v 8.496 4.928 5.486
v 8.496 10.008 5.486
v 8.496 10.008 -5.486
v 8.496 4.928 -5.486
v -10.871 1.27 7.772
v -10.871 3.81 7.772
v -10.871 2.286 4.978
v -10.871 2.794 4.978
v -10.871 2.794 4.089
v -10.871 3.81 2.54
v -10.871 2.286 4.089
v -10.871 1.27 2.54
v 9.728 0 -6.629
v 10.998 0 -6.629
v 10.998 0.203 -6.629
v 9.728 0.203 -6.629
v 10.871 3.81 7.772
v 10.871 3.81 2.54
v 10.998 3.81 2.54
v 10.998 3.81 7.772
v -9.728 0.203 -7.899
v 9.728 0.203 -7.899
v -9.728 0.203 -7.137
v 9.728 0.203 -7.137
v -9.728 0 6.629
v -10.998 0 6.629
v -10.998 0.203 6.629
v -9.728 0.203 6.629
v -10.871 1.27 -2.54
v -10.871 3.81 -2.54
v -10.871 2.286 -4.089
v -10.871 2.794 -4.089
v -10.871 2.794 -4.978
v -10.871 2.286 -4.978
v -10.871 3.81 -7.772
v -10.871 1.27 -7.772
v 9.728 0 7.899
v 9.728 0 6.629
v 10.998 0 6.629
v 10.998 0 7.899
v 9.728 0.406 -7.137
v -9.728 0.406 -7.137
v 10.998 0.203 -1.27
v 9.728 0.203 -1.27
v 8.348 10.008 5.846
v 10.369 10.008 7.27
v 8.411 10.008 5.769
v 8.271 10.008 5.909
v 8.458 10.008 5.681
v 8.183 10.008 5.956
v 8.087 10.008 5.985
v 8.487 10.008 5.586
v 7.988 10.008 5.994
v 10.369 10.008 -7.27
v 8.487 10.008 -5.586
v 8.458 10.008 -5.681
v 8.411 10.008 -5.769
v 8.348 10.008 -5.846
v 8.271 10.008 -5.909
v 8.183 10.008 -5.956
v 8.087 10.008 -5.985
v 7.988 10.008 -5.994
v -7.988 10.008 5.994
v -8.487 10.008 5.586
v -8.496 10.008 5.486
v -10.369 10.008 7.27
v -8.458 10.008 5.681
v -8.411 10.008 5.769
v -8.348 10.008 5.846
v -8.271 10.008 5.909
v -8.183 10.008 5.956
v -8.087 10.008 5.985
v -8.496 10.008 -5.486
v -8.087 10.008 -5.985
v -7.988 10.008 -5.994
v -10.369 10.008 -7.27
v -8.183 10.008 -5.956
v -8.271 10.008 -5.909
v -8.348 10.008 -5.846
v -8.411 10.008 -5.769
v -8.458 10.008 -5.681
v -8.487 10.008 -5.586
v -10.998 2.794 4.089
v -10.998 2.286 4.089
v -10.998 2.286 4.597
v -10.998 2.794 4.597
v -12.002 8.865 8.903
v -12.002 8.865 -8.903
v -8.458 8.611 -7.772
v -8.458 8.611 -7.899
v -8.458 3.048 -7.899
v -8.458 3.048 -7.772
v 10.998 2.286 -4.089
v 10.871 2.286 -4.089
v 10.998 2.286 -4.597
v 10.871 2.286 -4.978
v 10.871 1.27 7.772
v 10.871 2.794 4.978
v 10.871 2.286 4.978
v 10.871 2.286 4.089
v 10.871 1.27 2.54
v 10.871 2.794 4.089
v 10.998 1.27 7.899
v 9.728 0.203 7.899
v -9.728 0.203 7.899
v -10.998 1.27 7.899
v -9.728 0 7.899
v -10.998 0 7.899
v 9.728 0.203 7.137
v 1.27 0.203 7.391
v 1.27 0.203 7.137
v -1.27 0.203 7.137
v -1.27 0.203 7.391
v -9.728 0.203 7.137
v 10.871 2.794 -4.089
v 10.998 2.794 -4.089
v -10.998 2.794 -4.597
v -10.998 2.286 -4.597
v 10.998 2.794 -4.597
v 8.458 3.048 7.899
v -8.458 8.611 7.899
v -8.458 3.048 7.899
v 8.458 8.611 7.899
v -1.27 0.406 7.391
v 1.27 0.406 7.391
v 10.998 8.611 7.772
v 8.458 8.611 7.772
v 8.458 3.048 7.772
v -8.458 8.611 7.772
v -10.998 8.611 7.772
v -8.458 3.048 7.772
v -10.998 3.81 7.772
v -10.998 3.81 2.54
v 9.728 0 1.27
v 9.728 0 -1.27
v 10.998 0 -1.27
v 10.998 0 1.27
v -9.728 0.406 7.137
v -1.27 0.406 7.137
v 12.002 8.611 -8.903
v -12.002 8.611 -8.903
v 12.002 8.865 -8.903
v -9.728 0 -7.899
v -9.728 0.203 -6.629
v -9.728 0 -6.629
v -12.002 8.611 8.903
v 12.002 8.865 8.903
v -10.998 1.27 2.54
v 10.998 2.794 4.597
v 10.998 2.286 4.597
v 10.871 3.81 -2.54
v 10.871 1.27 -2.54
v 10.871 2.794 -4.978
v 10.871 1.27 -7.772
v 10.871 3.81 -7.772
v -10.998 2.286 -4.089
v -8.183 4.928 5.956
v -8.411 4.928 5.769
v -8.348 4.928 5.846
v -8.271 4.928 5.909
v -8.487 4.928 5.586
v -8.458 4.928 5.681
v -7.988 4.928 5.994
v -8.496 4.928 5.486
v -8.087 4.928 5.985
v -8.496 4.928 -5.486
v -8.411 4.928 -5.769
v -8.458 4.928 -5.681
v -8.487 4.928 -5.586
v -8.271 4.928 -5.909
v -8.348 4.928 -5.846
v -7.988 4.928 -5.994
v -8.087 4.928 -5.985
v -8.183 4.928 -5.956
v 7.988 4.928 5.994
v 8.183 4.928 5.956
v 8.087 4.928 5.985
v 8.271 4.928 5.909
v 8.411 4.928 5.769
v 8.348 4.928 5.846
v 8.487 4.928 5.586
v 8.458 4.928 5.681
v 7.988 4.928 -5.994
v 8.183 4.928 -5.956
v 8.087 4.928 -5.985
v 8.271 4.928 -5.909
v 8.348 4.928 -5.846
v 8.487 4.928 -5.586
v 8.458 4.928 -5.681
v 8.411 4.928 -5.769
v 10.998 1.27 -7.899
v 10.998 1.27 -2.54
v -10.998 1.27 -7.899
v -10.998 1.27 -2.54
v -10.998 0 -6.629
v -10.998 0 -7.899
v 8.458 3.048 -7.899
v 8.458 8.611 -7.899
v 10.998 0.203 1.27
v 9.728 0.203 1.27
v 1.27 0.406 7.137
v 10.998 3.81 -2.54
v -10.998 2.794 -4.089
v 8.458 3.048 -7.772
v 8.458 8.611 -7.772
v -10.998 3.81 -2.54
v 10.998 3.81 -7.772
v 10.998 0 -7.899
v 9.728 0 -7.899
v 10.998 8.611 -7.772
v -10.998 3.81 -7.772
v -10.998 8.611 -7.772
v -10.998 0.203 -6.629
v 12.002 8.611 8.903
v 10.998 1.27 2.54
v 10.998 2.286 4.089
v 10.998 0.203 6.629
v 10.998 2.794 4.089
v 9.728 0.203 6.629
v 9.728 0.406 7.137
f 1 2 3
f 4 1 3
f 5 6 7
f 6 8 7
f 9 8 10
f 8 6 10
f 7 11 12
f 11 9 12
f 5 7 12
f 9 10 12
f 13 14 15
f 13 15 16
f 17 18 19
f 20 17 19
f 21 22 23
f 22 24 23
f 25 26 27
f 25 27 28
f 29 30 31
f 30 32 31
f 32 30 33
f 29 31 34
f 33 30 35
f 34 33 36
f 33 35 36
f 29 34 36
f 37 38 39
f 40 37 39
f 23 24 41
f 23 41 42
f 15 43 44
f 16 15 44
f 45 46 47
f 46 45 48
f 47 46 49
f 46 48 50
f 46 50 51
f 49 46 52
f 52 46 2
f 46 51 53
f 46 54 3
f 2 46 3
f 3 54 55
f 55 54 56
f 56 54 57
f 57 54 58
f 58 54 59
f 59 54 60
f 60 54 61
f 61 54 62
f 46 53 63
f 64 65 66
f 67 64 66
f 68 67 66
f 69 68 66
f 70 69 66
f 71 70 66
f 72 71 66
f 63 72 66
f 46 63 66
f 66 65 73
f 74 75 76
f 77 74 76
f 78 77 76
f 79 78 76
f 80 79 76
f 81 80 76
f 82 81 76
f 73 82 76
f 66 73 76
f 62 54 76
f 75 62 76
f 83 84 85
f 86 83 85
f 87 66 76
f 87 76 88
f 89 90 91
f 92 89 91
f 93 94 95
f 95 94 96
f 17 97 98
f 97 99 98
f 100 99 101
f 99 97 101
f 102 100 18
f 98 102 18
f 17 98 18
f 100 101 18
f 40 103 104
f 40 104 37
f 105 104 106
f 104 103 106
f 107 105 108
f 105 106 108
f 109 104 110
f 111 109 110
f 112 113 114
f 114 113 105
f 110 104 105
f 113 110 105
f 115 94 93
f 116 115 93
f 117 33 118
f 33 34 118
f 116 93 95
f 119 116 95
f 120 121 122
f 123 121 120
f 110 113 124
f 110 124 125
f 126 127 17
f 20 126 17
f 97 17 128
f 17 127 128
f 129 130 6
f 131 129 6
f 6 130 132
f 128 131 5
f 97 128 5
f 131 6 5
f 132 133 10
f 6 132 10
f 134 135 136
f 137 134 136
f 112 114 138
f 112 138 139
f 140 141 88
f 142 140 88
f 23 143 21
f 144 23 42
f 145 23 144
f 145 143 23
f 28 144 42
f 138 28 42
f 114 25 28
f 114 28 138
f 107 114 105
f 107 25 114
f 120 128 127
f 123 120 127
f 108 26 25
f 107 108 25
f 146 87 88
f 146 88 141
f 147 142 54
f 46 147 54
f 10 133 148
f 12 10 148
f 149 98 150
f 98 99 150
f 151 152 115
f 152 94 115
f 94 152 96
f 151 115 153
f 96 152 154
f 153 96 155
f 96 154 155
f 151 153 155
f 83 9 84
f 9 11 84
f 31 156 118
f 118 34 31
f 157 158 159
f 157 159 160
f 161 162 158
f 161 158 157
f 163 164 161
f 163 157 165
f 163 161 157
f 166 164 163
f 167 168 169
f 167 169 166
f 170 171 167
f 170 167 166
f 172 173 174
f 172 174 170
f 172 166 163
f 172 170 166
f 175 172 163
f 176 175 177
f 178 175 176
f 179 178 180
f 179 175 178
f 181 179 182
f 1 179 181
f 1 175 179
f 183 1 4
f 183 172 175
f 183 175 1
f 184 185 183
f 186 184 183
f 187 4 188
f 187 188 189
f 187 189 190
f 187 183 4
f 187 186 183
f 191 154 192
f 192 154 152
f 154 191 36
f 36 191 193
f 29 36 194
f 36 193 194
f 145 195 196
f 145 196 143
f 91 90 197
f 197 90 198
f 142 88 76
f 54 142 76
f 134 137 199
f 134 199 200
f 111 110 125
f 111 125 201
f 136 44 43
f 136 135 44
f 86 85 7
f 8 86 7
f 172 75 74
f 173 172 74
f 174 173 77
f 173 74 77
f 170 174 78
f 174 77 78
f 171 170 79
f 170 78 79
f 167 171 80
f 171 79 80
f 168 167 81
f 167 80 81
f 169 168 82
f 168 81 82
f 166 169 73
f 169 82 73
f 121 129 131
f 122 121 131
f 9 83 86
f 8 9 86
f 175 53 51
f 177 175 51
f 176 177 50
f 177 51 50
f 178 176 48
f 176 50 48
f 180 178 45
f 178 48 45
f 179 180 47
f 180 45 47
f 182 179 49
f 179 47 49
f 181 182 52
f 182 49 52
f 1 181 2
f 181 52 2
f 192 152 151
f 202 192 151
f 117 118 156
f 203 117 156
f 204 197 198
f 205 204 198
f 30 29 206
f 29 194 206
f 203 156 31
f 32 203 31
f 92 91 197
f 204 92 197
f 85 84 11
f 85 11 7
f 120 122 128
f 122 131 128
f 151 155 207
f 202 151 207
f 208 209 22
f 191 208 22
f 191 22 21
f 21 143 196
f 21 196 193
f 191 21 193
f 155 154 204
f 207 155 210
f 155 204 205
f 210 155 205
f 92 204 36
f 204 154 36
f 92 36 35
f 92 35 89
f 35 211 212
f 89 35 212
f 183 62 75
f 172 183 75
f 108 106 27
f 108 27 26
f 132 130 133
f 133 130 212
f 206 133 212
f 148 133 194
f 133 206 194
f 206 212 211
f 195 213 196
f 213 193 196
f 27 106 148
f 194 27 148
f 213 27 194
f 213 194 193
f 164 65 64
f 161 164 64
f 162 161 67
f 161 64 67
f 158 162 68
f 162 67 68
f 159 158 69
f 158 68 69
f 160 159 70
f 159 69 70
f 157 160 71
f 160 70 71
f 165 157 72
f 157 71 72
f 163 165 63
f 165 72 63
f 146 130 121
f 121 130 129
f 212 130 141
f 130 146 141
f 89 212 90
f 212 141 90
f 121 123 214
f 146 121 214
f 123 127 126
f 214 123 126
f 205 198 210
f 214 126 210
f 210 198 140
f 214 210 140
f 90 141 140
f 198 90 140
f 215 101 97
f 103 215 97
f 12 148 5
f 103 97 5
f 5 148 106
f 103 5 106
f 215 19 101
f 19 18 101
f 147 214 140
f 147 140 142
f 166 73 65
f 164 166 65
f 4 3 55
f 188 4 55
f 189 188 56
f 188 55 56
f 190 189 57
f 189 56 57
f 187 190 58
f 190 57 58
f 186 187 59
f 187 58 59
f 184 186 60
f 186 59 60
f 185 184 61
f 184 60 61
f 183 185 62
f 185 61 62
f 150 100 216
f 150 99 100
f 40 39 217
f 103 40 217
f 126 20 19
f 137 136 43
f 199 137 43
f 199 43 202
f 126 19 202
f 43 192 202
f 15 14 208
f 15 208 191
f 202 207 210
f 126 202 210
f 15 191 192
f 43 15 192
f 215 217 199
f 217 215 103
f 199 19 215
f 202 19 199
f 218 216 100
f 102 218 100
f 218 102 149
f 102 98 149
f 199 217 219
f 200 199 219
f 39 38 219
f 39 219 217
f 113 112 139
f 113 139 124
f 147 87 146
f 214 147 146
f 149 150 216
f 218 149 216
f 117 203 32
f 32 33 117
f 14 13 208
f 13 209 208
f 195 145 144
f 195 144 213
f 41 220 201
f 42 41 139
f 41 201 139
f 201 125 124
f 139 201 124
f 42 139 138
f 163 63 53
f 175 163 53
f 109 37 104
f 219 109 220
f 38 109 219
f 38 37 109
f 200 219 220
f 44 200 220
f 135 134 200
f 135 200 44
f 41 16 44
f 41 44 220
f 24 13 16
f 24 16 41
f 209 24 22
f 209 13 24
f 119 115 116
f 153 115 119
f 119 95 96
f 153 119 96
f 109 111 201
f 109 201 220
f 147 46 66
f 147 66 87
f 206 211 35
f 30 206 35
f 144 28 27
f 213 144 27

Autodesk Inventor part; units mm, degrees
sketch "Sketch_2" plane through (0, 0, 0) normal (0, 0, 1) x (1, 0, 0)
  line L0 (-12.0015, 8.6106) -> (-10.9982, 8.6106)
  line L1 (-10.9982, 8.6106) -> (-10.9982, 3.81)
  line L2 (-10.9982, 3.81) -> (-10.8712, 3.81)
  line L3 (-10.8712, 3.81) -> (-10.8712, 1.27)
  line L4 (-10.8712, 1.27) -> (-10.9982, 1.27)
  line L5 (-10.9982, 1.27) -> (-10.9982, 0)
  line L6 (-10.9982, 0) -> (10.9982, 0)
  line L7 (10.9982, 0) -> (10.9982, 1.27)
  line L8 (10.9982, 1.27) -> (10.8712, 1.27)
  line L9 (10.8712, 1.27) -> (10.8712, 3.81)
  line L10 (10.8712, 3.81) -> (10.9982, 3.81)
  line L11 (10.9982, 3.81) -> (10.9982, 8.6106)
  line L12 (10.9982, 8.6106) -> (12.0015, 8.6106)
  line L13 (12.0015, 8.6106) -> (12.0015, 8.8646)
  line L14 (12.0015, 8.8646) -> (10.3691, 10.0076)
  line L15 (10.3691, 10.0076) -> (-10.3691, 10.0076)
  line L16 (-10.3691, 10.0076) -> (-12.0015, 8.8646)
  line L17 (-12.0015, 8.8646) -> (-12.0015, 8.6106)
extrude "Extrusion1" add sketch "Sketch_2" along normal mid plane 24.003
sketch "Sketch_1" plane through (0, 0, 0) normal (1, 0, 0) x (0, 1, 0)
  line L0 (12.7, 12.7) -> (-2.54, 12.7)
  line L1 (-2.54, 12.7) -> (-2.54, -12.7)
  line L2 (-2.54, -12.7) -> (12.7, -12.7)
  line L3 (12.7, -12.7) -> (12.7, 12.7)
  line L4 (8.6106, 8.9027) -> (8.6106, 7.7724)
  line L5 (8.6106, 7.7724) -> (1.27, 7.7724)
  line L6 (1.27, 7.7724) -> (1.27, 7.8994)
  line L7 (1.27, 7.8994) -> (0, 7.8994)
  line L8 (0, 7.8994) -> (0, -7.8994)
  line L9 (0, -7.8994) -> (1.27, -7.8994)
  line L10 (1.27, -7.8994) -> (1.27, -7.7724)
  line L11 (1.27, -7.7724) -> (8.6106, -7.7724)
  line L12 (8.6106, -7.7724) -> (8.6106, -8.9027)
  line L13 (8.6106, -8.9027) -> (8.8646, -8.9027)
  line L14 (8.8646, -8.9027) -> (10.0076, -7.2703)
  line L15 (10.0076, -7.2703) -> (10.0076, 7.2703)
  line L16 (10.0076, 7.2703) -> (8.8646, 8.9027)
  line L17 (8.8646, 8.9027) -> (8.6106, 8.9027)
extrude "Extrusion2" cut sketch "Sketch_1" along normal mid plane 25.4
sketch "Sketch_3" plane through (0, 10.0076, 0) normal (0, 1, 0) x (1, 0, 0)
  line L0 (-8.4963, 5.4864) -> (-8.4963, -5.4864)
  arc A0 (-8.4963, -5.4864) -> (-7.9883, -5.9944) centre (-7.9883, -5.4864) ccw
  line L1 (-7.9883, -5.9944) -> (7.9883, -5.9944)
  arc A1 (7.9883, -5.9944) -> (8.4963, -5.4864) centre (7.9883, -5.4864) ccw
  line L2 (8.4963, -5.4864) -> (8.4963, 5.4864)
  arc A2 (8.4963, 5.4864) -> (7.9883, 5.9944) centre (7.9883, 5.4864) ccw
  line L3 (7.9883, 5.9944) -> (-7.9883, 5.9944)
  arc A3 (-7.9883, 5.9944) -> (-8.4963, 5.4864) centre (-7.9883, 5.4864) ccw
sketch "Sketch_4" plane through (0, 0, 0) normal (0, 1, 0) x (-1, 0, 0)
  line L0 (10.9982, -6.6294) -> (10.9982, 6.6294)
  line L1 (10.9982, 6.6294) -> (9.7282, 6.6294)
  line L2 (9.7282, 6.6294) -> (9.7282, 7.8994)
  line L3 (9.7282, 7.8994) -> (-9.7282, 7.8994)
  line L4 (-9.7282, 7.8994) -> (-9.7282, 6.6294)
  line L5 (-9.7282, 6.6294) -> (-10.9982, 6.6294)
  line L6 (-10.9982, 6.6294) -> (-10.9982, 1.27)
  line L7 (-10.9982, 1.27) -> (-9.7282, 1.27)
  line L8 (-9.7282, 1.27) -> (-9.7282, -1.27)
  line L9 (-9.7282, -1.27) -> (-10.9982, -1.27)
  line L10 (-10.9982, -1.27) -> (-10.9982, -6.6294)
  line L11 (-10.9982, -6.6294) -> (-9.7282, -6.6294)
  line L12 (-9.7282, -6.6294) -> (-9.7282, -7.8994)
  line L13 (-9.7282, -7.8994) -> (9.7282, -7.8994)
  line L14 (9.7282, -7.8994) -> (9.7282, -6.6294)
  line L15 (9.7282, -6.6294) -> (10.9982, -6.6294)
extrude "Extrusion3" cut sketch "Sketch_4" along normal blind 0.2032
sketch "Sketch_6" plane through (0, 0, 0) normal (0, 1, 0) x (-1, 0, 0)
  line L0 (9.7282, 7.1374) -> (1.27, 7.1374)
  line L1 (1.27, 7.1374) -> (1.27, 7.3914)
  line L2 (1.27, 7.3914) -> (-1.27, 7.3914)
  line L3 (-1.27, 7.3914) -> (-1.27, 7.1374)
  line L4 (-1.27, 7.1374) -> (-9.7282, 7.1374)
  line L5 (-9.7282, 7.1374) -> (-9.7282, -7.1374)
  line L6 (-9.7282, -7.1374) -> (9.7282, -7.1374)
  line L7 (9.7282, -7.1374) -> (9.7282, 7.1374)
extrude "Extrusion4" cut sketch "Sketch_6" along normal blind 0.4064
sketch "Sketch_9" plane through (0, 0, 0) normal (1, 0, 0) x (0, 1, 0)
  line L0 (1.27, 2.54) -> (1.27, -2.54)
  line L1 (1.27, -2.54) -> (3.81, -2.54)
  line L2 (3.81, -2.54) -> (3.81, 2.54)
  line L3 (3.81, 2.54) -> (1.27, 2.54)
extrude "Extrusion5" add sketch "Sketch_9" along normal mid plane 21.9964
sketch "Sketch_8" plane through (0, 2.54, 0) normal (0, 1, 0) x (1, 0, 0)
  line L0 (-10.9982, -4.5974) -> (-10.7442, -5.3594)
  line L1 (-10.7442, -5.3594) -> (-10.7442, -6.6294)
  line L2 (-10.7442, -6.6294) -> (10.7442, -6.6294)
  line L3 (10.7442, -6.6294) -> (10.7442, -5.3594)
  line L4 (10.7442, -5.3594) -> (10.9982, -4.5974)
  line L5 (10.9982, -4.5974) -> (10.9982, -4.0894)
  line L6 (10.9982, -4.0894) -> (10.7442, -4.0894)
  line L7 (10.7442, -4.0894) -> (10.7442, 4.0894)
  line L8 (10.7442, 4.0894) -> (10.9982, 4.0894)
  line L9 (10.9982, 4.0894) -> (10.9982, 4.5974)
  line L10 (10.9982, 4.5974) -> (10.7442, 5.3594)
  line L11 (10.7442, 5.3594) -> (10.7442, 6.6294)
  line L12 (10.7442, 6.6294) -> (-10.7442, 6.6294)
  line L13 (-10.7442, 6.6294) -> (-10.7442, 5.3594)
  line L14 (-10.7442, 5.3594) -> (-10.9982, 4.5974)
  line L15 (-10.9982, 4.5974) -> (-10.9982, 4.0894)
  line L16 (-10.9982, 4.0894) -> (-10.7442, 4.0894)
  line L17 (-10.7442, 4.0894) -> (-10.7442, -4.0894)
  line L18 (-10.7442, -4.0894) -> (-10.9982, -4.0894)
  line L19 (-10.9982, -4.0894) -> (-10.9982, -4.5974)
extrude "Extrusion6" add sketch "Sketch_8" along normal mid plane 0.508
sketch "Sketch_19" plane through (0, 0, 0) normal (0, 0, 1) x (1, 0, 0)
  line L0 (-8.4582, 3.048) -> (8.4582, 3.048)
  line L1 (8.4582, 3.048) -> (8.4582, 8.6868)
  line L2 (8.4582, 8.6868) -> (-8.4582, 8.6868)
  line L3 (-8.4582, 8.6868) -> (-8.4582, 3.048)
extrude "Extrusion7" add sketch "Sketch_19" along normal mid plane 15.7988
extrude "Extrusion8" cut sketch "Sketch_3" against normal blind 5.08
ref_plane "D_XY" through (0, 0, 0) normal (0, 1, 0) x (1, 0, 0)
ref_plane "D_YZ" through (0, 0, 0) normal (1, 0, 0) x (0, 0, -1)
ref_plane "D_ZX" through (0, 0, 0) normal (0, 0, -1) x (0, 1, 0)
ref_plane "LENS_XY" through (0, 10.0076, 0) normal (0, -1, 0) x (1, 0, 0)
ref_plane "LENS_YZ" through (0, 10.0076, 0) normal (1, 0, 0) x (0, 0, 1)
ref_plane "LENS_ZX" through (0, 10.0076, 0) normal (0, 0, 1) x (0, -1, 0)
ref_plane "P_1_XY" through (7.62, 0.4064, 5.08) normal (0, 1, 0) x (1, 0, 0)
ref_plane "P_1_YZ" through (7.62, 0.4064, 5.08) normal (1, 0, 0) x (0, 0, -1)
ref_plane "P_1_ZX" through (7.62, 0.4064, 5.08) normal (0, 0, -1) x (0, 1, 0)
ref_plane "P_2_XY" through (7.62, 0.4064, 0) normal (0, 1, 0) x (1, 0, 0)
ref_plane "P_2_YZ" through (7.62, 0.4064, 0) normal (1, 0, 0) x (0, 0, -1)
ref_plane "P_2_ZX" through (7.62, 0.4064, 0) normal (0, 0, -1) x (0, 1, 0)
ref_plane "P_3_XY" through (7.62, 0.4064, -5.08) normal (0, 1, 0) x (1, 0, 0)
ref_plane "P_3_YZ" through (7.62, 0.4064, -5.08) normal (1, 0, 0) x (0, 0, -1)
ref_plane "P_3_ZX" through (7.62, 0.4064, -5.08) normal (0, 0, -1) x (0, 1, 0)
ref_plane "P_4_XY" through (0, 0.4064, 2.54) normal (0, 1, 0) x (1, 0, 0)
ref_plane "P_4_YZ" through (0, 0.4064, 2.54) normal (1, 0, 0) x (0, 0, -1)
ref_plane "P_4_ZX" through (0, 0.4064, 2.54) normal (0, 0, -1) x (0, 1, 0)
ref_plane "P_5_XY" through (0, 0.4064, -2.54) normal (0, 1, 0) x (1, 0, 0)
ref_plane "P_5_YZ" through (0, 0.4064, -2.54) normal (1, 0, 0) x (0, 0, -1)
ref_plane "P_5_ZX" through (0, 0.4064, -2.54) normal (0, 0, -1) x (0, 1, 0)
ref_plane "body_to_metal_1_XY" through (0, 0, 0) normal (0, -1, 0) x (1, 0, 0)
ref_plane "body_to_metal_1_YZ" through (0, 0, 0) normal (1, 0, 0) x (0, 0, 1)
ref_plane "body_to_metal_1_ZX" through (0, 0, 0) normal (0, 0, 1) x (0, -1, 0)
ref_plane "body_to_metal_2_XY" through (0, 0, 0) normal (0, -1, 0) x (1, 0, 0)
ref_plane "body_to_metal_2_YZ" through (0, 0, 0) normal (1, 0, 0) x (0, 0, 1)
ref_plane "body_to_metal_2_ZX" through (0, 0, 0) normal (0, 0, 1) x (0, -1, 0)
properties part number "UB16NKG015F-NR"
